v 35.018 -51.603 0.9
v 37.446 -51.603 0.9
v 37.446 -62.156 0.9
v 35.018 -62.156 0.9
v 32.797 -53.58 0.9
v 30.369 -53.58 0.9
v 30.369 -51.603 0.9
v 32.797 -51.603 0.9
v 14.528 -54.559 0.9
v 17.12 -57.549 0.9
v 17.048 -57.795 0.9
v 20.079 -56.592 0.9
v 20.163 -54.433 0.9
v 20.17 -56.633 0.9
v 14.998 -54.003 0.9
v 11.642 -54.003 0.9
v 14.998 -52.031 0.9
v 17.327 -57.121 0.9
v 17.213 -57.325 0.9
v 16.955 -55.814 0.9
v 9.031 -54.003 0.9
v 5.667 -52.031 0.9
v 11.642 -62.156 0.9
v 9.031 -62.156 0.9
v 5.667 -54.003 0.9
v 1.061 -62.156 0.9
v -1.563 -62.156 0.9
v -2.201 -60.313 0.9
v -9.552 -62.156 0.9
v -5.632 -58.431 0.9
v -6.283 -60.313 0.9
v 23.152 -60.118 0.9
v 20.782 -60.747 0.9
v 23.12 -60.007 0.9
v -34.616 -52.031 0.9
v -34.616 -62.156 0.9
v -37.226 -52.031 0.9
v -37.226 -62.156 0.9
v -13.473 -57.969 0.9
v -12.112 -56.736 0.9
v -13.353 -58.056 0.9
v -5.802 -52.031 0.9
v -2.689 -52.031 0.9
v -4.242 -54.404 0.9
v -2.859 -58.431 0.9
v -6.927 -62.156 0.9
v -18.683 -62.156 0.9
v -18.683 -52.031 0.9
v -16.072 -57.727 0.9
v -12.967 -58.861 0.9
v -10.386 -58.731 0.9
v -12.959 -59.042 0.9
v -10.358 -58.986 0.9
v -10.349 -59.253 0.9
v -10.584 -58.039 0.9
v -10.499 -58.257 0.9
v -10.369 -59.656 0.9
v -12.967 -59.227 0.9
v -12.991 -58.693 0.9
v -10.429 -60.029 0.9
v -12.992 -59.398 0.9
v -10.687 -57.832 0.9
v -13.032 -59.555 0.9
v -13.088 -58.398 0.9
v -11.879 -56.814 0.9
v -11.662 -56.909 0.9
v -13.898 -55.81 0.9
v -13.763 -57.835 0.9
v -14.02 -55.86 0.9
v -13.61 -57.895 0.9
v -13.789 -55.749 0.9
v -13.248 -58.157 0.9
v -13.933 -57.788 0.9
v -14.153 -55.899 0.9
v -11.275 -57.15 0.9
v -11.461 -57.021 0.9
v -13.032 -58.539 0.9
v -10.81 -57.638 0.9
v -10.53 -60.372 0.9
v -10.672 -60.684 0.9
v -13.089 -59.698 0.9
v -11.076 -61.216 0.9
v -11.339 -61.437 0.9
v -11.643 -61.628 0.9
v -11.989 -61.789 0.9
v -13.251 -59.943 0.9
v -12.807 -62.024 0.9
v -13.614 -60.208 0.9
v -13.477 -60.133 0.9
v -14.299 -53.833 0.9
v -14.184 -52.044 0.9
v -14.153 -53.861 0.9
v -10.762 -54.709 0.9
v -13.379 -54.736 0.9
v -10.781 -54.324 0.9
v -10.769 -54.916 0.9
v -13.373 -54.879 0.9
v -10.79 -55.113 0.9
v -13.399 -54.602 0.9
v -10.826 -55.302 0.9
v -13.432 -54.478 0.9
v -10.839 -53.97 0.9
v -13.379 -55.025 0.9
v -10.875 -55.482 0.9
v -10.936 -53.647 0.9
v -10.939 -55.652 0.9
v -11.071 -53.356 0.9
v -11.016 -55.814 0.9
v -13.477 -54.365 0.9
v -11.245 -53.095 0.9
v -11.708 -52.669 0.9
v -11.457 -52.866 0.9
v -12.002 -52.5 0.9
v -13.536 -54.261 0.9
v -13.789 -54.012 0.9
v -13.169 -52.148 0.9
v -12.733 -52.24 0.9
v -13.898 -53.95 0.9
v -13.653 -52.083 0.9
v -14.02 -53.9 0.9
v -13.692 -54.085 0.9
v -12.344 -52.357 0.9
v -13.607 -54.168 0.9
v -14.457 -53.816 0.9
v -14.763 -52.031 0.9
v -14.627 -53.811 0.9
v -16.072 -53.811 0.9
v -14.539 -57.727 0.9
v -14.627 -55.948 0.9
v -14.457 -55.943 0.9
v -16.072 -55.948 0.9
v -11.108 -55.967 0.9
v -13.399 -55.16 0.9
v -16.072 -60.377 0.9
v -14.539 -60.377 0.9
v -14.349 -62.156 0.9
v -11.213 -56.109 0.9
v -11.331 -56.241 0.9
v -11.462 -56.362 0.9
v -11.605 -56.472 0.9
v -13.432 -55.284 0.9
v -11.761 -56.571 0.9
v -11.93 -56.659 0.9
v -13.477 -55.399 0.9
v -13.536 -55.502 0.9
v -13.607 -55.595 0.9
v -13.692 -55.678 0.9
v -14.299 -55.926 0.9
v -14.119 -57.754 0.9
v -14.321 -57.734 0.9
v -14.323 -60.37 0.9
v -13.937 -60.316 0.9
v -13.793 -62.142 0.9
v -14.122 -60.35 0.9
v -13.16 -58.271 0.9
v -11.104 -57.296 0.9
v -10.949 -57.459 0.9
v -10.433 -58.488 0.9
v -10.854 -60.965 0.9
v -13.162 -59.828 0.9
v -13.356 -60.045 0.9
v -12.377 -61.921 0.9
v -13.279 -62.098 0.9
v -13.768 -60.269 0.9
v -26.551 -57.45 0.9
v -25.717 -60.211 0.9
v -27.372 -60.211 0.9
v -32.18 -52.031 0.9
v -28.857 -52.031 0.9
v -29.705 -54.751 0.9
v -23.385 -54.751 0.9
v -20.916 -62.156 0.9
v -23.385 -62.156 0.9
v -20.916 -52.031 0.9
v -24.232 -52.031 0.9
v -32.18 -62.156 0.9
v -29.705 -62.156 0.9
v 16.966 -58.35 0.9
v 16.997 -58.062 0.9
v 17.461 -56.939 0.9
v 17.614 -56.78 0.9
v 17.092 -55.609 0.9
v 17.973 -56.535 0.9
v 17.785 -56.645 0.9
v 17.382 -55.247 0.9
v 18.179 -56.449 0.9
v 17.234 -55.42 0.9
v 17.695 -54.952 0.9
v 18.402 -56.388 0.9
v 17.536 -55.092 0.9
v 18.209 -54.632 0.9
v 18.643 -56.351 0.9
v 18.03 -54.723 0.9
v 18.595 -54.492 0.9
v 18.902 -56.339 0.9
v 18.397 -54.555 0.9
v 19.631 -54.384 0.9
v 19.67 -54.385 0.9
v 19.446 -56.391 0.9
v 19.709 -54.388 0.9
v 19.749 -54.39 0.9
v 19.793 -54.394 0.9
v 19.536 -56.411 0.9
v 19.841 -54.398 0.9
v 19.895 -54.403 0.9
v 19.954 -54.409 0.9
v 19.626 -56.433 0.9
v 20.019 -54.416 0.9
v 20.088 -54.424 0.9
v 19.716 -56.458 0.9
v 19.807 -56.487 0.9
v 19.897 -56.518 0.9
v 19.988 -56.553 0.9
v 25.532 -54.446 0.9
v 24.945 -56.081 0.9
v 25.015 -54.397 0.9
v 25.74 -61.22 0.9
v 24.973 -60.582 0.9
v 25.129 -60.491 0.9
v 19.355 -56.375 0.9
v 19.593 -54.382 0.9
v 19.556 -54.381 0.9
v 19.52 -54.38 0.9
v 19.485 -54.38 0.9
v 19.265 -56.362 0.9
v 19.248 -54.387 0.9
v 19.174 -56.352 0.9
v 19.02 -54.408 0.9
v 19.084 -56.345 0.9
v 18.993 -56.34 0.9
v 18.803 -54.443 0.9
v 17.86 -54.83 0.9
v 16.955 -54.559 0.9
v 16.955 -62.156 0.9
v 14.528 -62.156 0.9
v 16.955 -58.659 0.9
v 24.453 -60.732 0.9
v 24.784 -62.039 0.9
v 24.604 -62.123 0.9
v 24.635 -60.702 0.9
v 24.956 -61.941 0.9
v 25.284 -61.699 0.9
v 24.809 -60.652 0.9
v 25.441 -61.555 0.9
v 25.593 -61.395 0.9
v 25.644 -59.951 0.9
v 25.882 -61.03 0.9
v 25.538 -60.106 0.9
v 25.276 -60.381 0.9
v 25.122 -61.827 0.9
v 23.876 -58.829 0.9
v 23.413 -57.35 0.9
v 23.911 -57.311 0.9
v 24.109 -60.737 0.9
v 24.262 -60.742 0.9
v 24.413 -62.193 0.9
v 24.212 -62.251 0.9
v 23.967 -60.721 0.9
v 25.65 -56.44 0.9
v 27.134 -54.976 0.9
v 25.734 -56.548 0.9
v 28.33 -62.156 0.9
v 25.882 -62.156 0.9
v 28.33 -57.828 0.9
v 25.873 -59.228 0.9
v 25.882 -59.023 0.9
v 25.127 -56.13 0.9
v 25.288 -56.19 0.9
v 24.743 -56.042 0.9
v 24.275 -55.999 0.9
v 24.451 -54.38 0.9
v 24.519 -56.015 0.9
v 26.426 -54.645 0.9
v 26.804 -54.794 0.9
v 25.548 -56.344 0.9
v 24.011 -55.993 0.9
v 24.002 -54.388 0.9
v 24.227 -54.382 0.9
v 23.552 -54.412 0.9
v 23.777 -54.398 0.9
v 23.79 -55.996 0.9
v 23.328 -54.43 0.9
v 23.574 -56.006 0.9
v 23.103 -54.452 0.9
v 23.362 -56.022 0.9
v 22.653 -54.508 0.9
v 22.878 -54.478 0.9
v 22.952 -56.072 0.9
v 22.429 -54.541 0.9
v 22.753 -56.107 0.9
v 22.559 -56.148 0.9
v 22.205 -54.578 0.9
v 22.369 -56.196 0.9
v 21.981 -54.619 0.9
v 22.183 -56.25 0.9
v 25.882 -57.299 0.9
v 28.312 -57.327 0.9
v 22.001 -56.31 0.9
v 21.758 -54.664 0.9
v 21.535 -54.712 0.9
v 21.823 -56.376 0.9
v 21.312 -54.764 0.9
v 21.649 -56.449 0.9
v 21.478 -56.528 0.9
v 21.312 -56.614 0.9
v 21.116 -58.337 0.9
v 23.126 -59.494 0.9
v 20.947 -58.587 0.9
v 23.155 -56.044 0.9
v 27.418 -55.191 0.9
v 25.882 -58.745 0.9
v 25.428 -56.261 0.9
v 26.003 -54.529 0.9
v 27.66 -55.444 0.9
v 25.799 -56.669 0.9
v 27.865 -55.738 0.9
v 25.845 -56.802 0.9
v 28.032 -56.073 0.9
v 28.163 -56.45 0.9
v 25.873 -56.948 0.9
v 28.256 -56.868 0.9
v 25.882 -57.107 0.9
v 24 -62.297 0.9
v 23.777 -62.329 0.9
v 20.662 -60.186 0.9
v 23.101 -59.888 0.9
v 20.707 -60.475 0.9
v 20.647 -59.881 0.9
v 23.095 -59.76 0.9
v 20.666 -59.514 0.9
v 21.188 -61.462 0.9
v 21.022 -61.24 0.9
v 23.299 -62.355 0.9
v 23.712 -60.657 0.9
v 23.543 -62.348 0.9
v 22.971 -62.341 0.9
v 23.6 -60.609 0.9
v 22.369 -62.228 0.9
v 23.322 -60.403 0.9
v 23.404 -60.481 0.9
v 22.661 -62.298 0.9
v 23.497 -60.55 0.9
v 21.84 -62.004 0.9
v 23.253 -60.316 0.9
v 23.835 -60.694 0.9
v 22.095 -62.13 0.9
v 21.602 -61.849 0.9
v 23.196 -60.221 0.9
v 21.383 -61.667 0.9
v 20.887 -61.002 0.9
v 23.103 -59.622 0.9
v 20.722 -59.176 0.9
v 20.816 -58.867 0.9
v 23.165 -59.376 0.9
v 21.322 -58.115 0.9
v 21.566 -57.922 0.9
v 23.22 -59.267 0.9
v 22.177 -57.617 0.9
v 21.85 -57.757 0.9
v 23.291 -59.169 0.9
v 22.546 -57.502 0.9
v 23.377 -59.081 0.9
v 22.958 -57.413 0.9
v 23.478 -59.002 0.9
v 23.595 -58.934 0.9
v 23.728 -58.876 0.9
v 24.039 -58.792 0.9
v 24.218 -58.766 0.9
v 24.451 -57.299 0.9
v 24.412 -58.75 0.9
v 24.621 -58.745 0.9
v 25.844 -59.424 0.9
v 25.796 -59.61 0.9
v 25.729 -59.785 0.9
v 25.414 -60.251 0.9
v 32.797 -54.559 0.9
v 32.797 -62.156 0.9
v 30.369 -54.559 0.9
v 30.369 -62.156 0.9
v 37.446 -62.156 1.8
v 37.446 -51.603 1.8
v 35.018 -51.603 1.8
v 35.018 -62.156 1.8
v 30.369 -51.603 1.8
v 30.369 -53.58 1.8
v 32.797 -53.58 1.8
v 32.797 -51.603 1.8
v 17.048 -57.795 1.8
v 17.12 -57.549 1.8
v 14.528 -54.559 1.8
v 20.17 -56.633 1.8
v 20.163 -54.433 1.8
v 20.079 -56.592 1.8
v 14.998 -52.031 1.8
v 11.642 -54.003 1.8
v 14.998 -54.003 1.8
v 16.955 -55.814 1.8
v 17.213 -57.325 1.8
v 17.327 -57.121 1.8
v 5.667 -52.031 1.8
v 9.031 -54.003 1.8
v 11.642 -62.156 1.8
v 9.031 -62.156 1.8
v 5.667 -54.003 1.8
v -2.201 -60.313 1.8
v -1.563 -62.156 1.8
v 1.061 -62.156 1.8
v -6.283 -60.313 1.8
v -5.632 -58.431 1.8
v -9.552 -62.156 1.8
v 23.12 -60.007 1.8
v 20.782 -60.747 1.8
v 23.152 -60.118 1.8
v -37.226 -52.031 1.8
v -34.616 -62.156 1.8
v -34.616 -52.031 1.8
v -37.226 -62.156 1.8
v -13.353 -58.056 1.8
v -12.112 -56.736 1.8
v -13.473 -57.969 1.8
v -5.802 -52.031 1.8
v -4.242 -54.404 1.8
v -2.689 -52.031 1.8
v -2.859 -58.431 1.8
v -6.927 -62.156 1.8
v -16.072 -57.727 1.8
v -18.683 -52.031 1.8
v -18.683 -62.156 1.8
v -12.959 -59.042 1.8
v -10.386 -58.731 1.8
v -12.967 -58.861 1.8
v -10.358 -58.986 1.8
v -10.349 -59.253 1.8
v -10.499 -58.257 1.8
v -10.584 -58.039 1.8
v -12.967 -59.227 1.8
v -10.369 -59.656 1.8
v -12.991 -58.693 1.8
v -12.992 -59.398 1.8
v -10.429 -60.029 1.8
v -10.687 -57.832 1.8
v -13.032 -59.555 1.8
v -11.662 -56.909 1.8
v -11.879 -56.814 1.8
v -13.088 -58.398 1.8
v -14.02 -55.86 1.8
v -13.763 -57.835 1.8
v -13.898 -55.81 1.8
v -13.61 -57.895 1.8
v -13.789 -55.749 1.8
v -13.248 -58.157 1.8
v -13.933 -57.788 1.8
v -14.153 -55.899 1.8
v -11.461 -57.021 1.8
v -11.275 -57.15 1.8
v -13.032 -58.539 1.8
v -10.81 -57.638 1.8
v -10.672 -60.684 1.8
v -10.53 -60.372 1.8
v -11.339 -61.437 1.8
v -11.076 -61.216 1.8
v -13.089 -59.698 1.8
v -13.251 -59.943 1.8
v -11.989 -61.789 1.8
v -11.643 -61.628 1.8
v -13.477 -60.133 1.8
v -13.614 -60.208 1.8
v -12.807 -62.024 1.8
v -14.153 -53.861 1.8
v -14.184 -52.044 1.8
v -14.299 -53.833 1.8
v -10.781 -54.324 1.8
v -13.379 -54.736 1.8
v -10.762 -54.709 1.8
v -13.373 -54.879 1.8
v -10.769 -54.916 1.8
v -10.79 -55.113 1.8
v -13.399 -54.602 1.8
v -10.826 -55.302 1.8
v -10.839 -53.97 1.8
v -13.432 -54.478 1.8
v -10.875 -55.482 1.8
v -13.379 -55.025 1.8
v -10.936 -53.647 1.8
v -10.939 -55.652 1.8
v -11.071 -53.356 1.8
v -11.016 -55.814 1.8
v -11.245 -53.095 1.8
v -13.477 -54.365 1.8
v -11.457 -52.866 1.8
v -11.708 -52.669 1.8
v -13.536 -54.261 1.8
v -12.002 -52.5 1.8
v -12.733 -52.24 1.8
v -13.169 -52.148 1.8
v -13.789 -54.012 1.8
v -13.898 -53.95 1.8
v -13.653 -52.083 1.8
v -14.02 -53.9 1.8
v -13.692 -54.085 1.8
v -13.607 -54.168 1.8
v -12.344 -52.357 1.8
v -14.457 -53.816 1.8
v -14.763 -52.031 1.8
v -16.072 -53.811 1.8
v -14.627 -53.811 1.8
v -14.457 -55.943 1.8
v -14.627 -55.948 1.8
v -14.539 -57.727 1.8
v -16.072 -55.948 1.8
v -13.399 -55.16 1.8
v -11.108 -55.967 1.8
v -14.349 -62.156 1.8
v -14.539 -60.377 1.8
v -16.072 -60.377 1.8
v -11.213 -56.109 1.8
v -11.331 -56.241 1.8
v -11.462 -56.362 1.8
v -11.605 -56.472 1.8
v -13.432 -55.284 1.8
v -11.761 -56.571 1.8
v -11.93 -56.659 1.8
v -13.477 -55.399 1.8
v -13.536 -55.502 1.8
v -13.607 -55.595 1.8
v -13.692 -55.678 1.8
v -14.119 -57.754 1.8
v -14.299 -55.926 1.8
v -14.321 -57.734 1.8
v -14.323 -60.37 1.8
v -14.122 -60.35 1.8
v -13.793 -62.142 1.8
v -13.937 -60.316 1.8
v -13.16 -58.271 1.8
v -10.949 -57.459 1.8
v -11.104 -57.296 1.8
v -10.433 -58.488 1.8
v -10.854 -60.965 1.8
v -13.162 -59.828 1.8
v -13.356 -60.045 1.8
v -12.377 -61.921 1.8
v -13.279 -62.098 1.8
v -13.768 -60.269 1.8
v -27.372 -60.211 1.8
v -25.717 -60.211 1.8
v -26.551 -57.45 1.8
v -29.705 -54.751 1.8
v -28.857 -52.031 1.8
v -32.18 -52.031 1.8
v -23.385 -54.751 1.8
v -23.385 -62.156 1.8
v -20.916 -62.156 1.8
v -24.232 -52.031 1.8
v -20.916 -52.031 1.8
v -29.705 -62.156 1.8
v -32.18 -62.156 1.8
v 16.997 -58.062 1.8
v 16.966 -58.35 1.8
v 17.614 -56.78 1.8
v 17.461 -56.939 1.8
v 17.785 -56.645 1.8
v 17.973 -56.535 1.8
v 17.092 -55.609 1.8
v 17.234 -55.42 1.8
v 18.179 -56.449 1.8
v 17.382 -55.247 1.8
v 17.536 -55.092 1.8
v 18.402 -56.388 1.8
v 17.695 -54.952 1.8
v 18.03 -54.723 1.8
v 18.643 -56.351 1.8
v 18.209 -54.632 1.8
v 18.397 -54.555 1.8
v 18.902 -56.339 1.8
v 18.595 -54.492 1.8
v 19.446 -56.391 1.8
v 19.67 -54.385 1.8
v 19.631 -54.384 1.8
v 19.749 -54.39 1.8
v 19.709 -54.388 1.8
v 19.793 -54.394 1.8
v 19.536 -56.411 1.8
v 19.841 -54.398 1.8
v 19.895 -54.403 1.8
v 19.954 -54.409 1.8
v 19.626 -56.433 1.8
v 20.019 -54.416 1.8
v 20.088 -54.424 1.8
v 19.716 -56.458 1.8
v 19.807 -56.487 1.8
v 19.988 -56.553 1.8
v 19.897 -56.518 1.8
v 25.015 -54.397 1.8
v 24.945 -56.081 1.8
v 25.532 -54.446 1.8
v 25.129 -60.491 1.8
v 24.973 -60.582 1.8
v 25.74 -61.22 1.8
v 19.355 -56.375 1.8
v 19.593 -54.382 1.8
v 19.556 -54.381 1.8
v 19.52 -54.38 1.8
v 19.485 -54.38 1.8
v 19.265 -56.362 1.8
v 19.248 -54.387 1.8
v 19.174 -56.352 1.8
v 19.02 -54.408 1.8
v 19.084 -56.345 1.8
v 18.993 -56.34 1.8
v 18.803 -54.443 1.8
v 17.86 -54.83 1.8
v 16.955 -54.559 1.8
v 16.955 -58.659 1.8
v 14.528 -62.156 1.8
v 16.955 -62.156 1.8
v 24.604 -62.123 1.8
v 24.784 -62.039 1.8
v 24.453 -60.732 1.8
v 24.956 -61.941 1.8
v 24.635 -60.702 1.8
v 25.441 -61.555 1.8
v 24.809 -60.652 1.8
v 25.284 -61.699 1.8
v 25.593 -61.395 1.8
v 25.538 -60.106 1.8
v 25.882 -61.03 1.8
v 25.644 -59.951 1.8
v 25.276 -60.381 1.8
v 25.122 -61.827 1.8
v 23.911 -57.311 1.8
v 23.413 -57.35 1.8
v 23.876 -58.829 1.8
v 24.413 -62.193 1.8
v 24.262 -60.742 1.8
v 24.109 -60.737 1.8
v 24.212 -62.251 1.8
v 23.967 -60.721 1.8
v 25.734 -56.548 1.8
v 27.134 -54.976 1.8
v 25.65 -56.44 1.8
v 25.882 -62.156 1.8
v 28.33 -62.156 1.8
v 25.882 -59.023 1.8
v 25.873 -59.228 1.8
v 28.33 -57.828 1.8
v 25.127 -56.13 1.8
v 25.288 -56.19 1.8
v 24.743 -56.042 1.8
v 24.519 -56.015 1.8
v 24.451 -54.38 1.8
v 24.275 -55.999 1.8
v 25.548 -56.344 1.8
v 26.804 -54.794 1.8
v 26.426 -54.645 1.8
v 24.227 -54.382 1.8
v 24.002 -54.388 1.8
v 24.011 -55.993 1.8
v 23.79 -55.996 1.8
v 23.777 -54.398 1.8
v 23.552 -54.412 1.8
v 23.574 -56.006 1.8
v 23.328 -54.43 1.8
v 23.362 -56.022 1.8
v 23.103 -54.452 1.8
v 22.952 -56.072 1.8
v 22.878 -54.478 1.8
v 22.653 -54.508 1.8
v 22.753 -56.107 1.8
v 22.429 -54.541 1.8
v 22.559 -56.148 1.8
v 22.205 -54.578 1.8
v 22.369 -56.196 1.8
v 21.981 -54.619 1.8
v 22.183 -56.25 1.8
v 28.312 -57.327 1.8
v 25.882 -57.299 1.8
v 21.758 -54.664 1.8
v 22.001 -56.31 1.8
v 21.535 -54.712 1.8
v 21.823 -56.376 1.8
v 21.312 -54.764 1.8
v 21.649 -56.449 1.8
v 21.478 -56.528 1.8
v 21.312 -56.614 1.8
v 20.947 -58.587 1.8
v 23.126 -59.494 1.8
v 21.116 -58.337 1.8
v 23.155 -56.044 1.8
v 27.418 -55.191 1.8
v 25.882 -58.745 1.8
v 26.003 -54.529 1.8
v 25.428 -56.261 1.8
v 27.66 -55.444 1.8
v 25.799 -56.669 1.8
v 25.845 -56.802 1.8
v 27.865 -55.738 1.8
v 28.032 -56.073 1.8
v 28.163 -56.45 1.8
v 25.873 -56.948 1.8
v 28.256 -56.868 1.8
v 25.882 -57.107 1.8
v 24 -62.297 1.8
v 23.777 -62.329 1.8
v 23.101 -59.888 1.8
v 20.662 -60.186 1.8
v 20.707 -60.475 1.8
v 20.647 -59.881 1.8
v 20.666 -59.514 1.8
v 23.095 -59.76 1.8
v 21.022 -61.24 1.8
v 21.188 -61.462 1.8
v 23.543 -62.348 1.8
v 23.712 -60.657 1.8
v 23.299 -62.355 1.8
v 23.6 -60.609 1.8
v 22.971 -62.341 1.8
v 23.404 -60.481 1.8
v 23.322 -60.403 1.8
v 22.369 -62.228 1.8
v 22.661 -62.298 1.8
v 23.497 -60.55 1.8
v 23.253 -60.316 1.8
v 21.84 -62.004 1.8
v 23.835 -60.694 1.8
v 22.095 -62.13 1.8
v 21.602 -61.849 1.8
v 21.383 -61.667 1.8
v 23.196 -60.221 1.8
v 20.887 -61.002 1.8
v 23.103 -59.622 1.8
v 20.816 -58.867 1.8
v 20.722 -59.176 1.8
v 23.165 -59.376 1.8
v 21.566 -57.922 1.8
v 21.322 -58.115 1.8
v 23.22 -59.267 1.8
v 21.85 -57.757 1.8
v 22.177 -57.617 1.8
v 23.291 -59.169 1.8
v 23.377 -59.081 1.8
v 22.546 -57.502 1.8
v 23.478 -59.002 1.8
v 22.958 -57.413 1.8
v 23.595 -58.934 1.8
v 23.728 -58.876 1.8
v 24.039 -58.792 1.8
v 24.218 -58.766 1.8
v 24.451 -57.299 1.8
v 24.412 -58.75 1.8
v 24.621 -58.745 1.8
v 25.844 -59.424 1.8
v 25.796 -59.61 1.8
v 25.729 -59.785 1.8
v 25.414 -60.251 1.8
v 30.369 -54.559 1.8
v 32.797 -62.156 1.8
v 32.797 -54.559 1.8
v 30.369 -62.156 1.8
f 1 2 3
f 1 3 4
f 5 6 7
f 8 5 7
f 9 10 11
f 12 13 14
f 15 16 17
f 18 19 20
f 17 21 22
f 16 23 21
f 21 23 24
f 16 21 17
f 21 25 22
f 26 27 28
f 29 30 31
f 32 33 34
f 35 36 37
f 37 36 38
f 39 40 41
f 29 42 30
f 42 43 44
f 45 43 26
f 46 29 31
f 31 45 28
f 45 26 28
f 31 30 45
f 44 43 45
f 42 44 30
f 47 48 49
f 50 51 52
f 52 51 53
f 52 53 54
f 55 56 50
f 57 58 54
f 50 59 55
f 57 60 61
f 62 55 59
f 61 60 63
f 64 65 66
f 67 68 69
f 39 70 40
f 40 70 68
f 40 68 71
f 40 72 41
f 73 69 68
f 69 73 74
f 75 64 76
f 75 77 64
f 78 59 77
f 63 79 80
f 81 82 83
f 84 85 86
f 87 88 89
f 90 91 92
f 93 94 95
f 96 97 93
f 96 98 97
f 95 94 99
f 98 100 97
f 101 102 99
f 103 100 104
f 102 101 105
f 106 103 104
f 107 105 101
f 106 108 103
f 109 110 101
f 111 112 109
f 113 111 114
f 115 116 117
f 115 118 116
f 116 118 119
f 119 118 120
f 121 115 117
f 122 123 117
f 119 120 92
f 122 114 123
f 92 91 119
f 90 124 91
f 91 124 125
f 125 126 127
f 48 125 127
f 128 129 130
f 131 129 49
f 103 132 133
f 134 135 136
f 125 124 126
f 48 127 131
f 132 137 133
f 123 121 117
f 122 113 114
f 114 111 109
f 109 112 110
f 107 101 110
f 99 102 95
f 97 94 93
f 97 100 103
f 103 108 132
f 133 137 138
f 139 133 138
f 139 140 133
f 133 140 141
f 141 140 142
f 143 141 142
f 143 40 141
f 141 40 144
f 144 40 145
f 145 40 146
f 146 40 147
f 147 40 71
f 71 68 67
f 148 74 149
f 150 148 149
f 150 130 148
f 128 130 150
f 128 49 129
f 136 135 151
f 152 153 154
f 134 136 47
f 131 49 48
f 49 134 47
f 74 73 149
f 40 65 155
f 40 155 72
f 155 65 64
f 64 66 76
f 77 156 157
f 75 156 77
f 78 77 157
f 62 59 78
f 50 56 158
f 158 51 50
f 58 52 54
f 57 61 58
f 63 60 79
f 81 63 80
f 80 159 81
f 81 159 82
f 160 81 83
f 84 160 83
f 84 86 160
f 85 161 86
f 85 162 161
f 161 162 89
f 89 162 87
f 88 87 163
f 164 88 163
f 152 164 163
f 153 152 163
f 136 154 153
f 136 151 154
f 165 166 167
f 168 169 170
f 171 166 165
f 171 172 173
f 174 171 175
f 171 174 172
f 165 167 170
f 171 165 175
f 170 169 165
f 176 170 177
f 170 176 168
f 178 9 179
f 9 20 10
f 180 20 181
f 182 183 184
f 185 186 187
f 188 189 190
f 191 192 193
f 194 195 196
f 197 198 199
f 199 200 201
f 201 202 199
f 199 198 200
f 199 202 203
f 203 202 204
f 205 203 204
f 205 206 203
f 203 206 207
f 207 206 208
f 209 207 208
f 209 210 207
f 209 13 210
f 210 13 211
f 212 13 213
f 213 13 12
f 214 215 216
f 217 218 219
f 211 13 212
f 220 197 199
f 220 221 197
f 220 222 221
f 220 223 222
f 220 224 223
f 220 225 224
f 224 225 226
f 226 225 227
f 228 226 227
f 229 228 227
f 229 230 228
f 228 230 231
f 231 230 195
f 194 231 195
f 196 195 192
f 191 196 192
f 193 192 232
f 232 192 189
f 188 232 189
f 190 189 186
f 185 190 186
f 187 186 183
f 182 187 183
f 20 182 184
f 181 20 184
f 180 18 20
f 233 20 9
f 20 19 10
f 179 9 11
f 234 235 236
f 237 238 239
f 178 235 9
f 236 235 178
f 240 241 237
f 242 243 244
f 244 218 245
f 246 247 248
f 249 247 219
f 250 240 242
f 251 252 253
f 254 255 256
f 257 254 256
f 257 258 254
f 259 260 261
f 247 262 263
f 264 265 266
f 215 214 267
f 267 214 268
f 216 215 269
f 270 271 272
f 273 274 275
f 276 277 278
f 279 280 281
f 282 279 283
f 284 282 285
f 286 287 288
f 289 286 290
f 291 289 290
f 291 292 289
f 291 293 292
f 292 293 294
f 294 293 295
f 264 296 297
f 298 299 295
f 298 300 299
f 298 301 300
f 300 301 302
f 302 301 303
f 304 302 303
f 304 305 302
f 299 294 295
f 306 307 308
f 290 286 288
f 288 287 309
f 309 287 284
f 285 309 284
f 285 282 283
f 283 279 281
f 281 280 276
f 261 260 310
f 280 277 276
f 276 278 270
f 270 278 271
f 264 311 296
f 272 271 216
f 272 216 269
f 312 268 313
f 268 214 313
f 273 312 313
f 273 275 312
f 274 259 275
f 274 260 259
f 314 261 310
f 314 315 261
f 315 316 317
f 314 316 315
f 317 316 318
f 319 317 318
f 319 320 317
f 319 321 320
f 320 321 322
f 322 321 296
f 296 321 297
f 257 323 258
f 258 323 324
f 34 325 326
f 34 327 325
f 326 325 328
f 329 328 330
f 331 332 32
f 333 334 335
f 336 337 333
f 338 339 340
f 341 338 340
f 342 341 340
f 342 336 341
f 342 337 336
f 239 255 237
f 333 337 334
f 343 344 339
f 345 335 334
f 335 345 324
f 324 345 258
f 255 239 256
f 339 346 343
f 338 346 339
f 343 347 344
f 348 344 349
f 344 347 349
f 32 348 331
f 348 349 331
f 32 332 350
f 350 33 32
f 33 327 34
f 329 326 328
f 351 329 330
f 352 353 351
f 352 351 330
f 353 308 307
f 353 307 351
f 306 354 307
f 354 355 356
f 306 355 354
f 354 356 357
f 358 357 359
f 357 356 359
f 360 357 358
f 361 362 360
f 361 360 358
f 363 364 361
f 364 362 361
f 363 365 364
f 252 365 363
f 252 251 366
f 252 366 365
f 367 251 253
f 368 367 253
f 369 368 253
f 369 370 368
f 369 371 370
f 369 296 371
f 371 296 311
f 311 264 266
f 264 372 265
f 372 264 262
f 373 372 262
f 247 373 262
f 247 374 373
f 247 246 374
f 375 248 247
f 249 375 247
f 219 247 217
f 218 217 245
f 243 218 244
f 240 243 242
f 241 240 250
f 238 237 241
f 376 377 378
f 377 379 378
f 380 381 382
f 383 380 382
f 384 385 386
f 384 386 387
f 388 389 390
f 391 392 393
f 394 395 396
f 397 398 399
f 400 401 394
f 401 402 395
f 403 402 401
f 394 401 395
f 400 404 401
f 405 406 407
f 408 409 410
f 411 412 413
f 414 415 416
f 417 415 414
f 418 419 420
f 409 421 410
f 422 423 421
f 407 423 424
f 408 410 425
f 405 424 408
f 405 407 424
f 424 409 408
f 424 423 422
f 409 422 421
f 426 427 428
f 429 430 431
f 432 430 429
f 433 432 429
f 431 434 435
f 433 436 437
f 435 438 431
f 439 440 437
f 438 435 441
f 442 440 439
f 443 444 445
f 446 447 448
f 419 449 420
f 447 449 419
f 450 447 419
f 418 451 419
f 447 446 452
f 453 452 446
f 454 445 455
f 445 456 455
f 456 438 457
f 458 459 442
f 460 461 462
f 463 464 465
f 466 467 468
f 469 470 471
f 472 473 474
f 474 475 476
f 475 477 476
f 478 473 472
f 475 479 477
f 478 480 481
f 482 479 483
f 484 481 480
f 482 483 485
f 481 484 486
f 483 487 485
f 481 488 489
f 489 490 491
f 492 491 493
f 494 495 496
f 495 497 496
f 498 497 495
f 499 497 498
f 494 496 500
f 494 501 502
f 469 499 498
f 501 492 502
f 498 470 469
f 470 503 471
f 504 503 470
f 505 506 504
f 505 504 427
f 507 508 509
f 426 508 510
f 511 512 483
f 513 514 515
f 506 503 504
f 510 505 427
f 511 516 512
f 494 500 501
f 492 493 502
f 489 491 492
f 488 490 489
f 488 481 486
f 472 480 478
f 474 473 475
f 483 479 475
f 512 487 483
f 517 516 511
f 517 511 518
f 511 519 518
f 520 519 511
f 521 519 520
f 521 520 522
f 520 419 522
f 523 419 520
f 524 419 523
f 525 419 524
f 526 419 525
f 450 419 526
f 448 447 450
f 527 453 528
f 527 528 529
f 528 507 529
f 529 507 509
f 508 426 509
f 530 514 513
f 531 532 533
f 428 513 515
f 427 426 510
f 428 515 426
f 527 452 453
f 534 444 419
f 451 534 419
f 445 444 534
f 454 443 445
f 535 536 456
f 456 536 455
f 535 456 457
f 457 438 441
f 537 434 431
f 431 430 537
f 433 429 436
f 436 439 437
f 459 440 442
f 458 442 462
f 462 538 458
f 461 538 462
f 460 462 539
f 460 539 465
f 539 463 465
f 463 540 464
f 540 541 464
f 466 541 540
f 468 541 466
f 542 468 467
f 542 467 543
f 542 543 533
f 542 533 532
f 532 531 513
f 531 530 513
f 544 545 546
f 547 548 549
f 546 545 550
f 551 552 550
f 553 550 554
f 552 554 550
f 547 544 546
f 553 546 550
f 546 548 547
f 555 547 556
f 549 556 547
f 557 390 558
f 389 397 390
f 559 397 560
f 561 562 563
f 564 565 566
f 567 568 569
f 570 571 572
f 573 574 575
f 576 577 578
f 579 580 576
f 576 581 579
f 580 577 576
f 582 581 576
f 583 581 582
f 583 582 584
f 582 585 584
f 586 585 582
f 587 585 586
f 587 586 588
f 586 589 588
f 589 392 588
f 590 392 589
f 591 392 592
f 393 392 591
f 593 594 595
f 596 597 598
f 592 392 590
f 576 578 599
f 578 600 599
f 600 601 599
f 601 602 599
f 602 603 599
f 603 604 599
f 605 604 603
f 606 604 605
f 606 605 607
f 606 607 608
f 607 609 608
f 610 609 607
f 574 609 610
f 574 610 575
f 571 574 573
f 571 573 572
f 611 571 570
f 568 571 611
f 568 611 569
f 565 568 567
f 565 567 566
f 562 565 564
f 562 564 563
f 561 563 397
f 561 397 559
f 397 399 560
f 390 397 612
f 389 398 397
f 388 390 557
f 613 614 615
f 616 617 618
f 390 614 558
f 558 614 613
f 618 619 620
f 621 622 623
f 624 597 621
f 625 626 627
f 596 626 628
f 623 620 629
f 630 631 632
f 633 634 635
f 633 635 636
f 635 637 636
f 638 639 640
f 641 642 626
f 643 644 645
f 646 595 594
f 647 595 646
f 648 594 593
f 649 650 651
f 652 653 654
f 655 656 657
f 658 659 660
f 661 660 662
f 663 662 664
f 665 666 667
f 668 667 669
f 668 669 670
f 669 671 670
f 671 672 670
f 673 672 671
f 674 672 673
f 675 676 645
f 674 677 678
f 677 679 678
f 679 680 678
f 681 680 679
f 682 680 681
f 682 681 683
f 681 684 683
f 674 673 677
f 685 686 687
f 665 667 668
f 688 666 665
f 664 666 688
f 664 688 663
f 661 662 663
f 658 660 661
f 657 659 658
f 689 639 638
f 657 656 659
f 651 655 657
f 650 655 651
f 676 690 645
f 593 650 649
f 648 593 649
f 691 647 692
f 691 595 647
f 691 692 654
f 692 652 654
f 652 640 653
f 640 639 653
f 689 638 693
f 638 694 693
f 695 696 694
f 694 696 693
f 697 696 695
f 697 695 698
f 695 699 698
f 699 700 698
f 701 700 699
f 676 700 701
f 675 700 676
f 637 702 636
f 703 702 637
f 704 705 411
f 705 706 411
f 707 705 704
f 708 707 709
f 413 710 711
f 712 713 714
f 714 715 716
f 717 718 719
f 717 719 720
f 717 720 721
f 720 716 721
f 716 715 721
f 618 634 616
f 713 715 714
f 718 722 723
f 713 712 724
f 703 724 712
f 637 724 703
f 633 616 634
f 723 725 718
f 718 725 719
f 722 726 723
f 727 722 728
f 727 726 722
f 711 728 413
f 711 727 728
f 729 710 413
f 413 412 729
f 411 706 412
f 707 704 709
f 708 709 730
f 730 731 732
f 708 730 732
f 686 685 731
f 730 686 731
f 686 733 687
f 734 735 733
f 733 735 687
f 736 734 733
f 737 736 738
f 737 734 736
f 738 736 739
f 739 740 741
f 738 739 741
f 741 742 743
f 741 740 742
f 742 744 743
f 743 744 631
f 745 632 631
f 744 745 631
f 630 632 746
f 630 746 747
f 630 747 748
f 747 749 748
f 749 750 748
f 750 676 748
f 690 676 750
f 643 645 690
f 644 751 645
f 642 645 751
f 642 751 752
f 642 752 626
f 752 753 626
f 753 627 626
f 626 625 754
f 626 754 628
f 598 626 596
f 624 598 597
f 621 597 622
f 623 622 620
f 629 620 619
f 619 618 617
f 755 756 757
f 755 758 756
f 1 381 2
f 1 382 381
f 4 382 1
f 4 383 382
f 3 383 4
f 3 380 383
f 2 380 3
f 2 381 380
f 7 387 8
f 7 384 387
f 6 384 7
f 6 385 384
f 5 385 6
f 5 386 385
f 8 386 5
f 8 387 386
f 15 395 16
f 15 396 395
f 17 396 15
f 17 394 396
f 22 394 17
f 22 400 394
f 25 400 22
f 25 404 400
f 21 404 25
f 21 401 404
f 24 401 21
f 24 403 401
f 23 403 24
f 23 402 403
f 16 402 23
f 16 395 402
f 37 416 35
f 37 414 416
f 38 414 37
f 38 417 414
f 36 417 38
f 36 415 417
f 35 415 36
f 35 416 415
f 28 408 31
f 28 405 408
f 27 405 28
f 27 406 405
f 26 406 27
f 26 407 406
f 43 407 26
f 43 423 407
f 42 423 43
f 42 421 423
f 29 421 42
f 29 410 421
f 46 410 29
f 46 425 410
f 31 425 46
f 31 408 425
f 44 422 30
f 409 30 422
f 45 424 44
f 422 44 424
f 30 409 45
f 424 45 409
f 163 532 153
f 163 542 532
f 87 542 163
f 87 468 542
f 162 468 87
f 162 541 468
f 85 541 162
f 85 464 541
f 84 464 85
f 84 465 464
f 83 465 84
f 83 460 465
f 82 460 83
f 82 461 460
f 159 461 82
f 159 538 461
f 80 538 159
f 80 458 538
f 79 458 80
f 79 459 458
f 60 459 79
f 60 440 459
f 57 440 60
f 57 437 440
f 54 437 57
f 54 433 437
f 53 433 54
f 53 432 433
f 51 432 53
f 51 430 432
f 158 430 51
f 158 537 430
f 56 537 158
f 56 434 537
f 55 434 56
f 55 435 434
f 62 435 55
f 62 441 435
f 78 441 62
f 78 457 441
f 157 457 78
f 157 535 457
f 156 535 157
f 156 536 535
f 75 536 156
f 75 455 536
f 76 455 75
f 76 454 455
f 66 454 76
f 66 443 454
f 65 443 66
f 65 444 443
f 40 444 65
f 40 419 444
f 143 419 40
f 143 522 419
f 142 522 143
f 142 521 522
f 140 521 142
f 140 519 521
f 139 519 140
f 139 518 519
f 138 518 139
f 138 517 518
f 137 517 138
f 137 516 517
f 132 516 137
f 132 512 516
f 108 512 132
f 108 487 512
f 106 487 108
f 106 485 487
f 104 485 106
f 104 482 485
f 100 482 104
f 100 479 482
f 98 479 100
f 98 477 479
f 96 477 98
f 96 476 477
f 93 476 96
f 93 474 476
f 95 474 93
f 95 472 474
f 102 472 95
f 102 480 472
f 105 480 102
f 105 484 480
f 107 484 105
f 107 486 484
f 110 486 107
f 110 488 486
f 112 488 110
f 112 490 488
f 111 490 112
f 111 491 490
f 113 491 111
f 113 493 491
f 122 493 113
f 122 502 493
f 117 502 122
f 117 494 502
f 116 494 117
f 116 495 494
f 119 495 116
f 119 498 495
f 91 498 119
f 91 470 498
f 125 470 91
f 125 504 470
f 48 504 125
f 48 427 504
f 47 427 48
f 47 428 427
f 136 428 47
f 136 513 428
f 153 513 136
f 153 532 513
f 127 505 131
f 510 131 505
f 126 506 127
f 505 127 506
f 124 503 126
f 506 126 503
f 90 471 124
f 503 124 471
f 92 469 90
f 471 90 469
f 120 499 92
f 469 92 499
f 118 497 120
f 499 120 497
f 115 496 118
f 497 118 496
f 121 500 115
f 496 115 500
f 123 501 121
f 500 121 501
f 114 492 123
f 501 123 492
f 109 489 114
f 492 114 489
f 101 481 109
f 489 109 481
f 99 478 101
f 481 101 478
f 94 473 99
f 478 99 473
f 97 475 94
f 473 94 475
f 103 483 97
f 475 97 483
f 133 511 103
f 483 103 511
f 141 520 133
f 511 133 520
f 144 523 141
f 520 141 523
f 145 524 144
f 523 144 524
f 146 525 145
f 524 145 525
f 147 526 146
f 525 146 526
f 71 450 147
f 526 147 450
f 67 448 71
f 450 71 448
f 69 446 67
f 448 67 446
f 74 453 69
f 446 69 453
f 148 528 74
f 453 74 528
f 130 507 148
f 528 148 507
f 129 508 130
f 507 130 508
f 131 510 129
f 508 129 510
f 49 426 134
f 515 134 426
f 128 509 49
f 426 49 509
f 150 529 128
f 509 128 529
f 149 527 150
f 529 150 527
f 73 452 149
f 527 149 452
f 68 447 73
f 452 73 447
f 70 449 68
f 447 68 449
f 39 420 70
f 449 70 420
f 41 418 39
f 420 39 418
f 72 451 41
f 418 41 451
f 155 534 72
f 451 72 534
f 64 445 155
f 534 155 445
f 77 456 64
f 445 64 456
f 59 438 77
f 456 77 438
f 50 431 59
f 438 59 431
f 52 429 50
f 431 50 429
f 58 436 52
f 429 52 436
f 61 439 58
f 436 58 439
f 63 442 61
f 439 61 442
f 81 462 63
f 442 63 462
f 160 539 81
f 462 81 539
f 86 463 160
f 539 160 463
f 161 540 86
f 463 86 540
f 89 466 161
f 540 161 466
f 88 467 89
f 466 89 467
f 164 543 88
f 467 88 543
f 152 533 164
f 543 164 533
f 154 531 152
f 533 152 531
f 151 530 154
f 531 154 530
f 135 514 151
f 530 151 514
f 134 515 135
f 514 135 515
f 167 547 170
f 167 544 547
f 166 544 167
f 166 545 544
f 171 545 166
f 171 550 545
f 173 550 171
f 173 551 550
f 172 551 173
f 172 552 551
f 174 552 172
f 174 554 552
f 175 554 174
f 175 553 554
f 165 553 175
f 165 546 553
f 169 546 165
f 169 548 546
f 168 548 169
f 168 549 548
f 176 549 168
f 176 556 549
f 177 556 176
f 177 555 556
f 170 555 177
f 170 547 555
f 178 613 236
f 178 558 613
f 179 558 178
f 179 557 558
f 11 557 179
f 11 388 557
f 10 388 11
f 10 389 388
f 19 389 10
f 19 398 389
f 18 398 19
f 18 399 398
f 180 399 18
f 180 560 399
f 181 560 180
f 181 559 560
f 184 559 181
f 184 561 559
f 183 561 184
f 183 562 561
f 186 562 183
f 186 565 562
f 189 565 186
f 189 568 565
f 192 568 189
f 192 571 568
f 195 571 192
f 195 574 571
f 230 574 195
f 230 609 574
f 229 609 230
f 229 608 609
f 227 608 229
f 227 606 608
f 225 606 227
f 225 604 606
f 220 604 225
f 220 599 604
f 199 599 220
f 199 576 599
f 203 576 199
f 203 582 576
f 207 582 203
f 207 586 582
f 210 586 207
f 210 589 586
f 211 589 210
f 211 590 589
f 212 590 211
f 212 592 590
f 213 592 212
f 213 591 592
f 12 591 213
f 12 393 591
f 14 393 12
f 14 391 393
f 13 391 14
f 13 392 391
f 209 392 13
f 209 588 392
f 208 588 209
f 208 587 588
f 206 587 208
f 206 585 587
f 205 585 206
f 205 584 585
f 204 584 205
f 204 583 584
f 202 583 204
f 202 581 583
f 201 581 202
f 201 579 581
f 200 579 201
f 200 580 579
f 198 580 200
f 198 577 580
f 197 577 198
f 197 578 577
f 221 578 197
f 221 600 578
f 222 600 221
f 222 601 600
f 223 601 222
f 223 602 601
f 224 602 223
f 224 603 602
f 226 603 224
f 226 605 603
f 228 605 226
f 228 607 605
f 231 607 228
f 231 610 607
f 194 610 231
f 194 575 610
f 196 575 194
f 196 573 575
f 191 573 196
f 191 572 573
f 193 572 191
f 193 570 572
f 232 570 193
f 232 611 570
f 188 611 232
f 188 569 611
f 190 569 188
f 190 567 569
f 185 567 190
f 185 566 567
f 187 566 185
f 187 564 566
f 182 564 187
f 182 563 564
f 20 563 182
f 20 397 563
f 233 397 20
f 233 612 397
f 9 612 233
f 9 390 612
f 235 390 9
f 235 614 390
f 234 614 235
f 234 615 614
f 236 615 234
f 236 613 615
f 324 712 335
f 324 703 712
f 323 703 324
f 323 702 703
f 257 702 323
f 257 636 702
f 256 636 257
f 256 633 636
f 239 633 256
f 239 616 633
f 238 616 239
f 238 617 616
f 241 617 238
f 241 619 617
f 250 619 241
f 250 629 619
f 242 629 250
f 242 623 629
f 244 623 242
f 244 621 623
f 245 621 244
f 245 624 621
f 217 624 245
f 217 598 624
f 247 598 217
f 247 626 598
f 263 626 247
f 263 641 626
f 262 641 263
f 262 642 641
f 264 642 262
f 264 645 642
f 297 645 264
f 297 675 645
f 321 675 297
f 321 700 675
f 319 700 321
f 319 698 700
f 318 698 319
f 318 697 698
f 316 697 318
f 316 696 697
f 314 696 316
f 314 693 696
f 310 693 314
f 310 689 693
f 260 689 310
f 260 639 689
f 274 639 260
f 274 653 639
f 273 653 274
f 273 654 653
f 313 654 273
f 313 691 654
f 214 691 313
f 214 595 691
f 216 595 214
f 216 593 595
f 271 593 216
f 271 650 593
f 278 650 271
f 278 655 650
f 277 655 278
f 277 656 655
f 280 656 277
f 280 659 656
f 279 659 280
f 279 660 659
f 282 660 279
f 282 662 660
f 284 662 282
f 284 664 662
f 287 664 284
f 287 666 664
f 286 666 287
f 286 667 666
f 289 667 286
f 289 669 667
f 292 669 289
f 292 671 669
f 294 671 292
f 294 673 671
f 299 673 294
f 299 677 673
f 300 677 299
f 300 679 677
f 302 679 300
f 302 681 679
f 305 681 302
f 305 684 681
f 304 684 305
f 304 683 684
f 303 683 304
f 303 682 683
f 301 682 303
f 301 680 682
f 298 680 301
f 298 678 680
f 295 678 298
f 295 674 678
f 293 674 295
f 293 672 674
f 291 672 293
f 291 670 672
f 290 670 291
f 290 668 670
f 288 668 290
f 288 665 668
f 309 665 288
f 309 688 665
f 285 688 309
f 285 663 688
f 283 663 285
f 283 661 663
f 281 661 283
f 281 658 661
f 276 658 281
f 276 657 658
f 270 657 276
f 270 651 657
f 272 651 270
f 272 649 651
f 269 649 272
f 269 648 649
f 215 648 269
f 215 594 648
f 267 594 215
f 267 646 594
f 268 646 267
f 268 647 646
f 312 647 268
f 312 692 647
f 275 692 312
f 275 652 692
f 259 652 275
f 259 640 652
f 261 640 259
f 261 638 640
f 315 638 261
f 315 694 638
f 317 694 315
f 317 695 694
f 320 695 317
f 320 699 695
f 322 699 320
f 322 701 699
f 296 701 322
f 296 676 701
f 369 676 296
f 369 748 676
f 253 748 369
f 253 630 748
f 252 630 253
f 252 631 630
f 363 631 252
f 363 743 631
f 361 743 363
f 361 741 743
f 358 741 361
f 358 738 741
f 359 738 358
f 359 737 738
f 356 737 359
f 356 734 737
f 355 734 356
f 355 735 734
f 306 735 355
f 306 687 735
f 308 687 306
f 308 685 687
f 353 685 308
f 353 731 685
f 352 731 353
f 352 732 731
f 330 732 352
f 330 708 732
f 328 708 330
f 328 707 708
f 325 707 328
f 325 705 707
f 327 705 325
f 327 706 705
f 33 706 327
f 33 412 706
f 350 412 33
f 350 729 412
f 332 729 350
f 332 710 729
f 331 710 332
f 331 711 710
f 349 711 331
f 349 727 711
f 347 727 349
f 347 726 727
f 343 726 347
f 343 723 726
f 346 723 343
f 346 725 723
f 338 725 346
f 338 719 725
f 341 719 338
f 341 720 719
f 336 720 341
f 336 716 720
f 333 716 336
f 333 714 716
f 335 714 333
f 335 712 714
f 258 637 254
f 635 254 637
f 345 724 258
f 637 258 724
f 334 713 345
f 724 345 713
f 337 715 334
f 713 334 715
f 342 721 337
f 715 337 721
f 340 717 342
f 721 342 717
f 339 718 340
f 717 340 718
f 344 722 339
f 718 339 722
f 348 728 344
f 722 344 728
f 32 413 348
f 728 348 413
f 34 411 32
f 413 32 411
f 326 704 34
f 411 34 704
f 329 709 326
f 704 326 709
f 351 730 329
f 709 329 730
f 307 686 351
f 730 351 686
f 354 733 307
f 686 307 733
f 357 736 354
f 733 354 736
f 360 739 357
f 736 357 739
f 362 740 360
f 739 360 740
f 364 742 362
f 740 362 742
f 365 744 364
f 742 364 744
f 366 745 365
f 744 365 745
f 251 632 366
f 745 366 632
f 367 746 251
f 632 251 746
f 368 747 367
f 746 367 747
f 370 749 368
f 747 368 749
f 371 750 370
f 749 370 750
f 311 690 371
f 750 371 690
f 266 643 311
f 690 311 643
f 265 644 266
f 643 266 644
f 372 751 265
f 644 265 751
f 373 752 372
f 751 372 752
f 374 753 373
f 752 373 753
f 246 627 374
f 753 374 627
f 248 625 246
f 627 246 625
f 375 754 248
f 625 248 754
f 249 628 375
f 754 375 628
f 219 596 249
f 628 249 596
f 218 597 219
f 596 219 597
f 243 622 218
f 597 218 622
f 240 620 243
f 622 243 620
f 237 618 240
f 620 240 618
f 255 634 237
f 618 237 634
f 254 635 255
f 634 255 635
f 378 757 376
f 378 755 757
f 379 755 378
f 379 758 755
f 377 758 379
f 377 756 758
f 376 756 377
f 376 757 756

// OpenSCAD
$fn = 48;
  // English (below bottom hole)
  translate([0, -57.100, 0.900]) linear_extrude(height=0.900) text("IMBA Trail", size=10.000, halign="center", valign="center", font="Helvetica Neue:style=Bold");
